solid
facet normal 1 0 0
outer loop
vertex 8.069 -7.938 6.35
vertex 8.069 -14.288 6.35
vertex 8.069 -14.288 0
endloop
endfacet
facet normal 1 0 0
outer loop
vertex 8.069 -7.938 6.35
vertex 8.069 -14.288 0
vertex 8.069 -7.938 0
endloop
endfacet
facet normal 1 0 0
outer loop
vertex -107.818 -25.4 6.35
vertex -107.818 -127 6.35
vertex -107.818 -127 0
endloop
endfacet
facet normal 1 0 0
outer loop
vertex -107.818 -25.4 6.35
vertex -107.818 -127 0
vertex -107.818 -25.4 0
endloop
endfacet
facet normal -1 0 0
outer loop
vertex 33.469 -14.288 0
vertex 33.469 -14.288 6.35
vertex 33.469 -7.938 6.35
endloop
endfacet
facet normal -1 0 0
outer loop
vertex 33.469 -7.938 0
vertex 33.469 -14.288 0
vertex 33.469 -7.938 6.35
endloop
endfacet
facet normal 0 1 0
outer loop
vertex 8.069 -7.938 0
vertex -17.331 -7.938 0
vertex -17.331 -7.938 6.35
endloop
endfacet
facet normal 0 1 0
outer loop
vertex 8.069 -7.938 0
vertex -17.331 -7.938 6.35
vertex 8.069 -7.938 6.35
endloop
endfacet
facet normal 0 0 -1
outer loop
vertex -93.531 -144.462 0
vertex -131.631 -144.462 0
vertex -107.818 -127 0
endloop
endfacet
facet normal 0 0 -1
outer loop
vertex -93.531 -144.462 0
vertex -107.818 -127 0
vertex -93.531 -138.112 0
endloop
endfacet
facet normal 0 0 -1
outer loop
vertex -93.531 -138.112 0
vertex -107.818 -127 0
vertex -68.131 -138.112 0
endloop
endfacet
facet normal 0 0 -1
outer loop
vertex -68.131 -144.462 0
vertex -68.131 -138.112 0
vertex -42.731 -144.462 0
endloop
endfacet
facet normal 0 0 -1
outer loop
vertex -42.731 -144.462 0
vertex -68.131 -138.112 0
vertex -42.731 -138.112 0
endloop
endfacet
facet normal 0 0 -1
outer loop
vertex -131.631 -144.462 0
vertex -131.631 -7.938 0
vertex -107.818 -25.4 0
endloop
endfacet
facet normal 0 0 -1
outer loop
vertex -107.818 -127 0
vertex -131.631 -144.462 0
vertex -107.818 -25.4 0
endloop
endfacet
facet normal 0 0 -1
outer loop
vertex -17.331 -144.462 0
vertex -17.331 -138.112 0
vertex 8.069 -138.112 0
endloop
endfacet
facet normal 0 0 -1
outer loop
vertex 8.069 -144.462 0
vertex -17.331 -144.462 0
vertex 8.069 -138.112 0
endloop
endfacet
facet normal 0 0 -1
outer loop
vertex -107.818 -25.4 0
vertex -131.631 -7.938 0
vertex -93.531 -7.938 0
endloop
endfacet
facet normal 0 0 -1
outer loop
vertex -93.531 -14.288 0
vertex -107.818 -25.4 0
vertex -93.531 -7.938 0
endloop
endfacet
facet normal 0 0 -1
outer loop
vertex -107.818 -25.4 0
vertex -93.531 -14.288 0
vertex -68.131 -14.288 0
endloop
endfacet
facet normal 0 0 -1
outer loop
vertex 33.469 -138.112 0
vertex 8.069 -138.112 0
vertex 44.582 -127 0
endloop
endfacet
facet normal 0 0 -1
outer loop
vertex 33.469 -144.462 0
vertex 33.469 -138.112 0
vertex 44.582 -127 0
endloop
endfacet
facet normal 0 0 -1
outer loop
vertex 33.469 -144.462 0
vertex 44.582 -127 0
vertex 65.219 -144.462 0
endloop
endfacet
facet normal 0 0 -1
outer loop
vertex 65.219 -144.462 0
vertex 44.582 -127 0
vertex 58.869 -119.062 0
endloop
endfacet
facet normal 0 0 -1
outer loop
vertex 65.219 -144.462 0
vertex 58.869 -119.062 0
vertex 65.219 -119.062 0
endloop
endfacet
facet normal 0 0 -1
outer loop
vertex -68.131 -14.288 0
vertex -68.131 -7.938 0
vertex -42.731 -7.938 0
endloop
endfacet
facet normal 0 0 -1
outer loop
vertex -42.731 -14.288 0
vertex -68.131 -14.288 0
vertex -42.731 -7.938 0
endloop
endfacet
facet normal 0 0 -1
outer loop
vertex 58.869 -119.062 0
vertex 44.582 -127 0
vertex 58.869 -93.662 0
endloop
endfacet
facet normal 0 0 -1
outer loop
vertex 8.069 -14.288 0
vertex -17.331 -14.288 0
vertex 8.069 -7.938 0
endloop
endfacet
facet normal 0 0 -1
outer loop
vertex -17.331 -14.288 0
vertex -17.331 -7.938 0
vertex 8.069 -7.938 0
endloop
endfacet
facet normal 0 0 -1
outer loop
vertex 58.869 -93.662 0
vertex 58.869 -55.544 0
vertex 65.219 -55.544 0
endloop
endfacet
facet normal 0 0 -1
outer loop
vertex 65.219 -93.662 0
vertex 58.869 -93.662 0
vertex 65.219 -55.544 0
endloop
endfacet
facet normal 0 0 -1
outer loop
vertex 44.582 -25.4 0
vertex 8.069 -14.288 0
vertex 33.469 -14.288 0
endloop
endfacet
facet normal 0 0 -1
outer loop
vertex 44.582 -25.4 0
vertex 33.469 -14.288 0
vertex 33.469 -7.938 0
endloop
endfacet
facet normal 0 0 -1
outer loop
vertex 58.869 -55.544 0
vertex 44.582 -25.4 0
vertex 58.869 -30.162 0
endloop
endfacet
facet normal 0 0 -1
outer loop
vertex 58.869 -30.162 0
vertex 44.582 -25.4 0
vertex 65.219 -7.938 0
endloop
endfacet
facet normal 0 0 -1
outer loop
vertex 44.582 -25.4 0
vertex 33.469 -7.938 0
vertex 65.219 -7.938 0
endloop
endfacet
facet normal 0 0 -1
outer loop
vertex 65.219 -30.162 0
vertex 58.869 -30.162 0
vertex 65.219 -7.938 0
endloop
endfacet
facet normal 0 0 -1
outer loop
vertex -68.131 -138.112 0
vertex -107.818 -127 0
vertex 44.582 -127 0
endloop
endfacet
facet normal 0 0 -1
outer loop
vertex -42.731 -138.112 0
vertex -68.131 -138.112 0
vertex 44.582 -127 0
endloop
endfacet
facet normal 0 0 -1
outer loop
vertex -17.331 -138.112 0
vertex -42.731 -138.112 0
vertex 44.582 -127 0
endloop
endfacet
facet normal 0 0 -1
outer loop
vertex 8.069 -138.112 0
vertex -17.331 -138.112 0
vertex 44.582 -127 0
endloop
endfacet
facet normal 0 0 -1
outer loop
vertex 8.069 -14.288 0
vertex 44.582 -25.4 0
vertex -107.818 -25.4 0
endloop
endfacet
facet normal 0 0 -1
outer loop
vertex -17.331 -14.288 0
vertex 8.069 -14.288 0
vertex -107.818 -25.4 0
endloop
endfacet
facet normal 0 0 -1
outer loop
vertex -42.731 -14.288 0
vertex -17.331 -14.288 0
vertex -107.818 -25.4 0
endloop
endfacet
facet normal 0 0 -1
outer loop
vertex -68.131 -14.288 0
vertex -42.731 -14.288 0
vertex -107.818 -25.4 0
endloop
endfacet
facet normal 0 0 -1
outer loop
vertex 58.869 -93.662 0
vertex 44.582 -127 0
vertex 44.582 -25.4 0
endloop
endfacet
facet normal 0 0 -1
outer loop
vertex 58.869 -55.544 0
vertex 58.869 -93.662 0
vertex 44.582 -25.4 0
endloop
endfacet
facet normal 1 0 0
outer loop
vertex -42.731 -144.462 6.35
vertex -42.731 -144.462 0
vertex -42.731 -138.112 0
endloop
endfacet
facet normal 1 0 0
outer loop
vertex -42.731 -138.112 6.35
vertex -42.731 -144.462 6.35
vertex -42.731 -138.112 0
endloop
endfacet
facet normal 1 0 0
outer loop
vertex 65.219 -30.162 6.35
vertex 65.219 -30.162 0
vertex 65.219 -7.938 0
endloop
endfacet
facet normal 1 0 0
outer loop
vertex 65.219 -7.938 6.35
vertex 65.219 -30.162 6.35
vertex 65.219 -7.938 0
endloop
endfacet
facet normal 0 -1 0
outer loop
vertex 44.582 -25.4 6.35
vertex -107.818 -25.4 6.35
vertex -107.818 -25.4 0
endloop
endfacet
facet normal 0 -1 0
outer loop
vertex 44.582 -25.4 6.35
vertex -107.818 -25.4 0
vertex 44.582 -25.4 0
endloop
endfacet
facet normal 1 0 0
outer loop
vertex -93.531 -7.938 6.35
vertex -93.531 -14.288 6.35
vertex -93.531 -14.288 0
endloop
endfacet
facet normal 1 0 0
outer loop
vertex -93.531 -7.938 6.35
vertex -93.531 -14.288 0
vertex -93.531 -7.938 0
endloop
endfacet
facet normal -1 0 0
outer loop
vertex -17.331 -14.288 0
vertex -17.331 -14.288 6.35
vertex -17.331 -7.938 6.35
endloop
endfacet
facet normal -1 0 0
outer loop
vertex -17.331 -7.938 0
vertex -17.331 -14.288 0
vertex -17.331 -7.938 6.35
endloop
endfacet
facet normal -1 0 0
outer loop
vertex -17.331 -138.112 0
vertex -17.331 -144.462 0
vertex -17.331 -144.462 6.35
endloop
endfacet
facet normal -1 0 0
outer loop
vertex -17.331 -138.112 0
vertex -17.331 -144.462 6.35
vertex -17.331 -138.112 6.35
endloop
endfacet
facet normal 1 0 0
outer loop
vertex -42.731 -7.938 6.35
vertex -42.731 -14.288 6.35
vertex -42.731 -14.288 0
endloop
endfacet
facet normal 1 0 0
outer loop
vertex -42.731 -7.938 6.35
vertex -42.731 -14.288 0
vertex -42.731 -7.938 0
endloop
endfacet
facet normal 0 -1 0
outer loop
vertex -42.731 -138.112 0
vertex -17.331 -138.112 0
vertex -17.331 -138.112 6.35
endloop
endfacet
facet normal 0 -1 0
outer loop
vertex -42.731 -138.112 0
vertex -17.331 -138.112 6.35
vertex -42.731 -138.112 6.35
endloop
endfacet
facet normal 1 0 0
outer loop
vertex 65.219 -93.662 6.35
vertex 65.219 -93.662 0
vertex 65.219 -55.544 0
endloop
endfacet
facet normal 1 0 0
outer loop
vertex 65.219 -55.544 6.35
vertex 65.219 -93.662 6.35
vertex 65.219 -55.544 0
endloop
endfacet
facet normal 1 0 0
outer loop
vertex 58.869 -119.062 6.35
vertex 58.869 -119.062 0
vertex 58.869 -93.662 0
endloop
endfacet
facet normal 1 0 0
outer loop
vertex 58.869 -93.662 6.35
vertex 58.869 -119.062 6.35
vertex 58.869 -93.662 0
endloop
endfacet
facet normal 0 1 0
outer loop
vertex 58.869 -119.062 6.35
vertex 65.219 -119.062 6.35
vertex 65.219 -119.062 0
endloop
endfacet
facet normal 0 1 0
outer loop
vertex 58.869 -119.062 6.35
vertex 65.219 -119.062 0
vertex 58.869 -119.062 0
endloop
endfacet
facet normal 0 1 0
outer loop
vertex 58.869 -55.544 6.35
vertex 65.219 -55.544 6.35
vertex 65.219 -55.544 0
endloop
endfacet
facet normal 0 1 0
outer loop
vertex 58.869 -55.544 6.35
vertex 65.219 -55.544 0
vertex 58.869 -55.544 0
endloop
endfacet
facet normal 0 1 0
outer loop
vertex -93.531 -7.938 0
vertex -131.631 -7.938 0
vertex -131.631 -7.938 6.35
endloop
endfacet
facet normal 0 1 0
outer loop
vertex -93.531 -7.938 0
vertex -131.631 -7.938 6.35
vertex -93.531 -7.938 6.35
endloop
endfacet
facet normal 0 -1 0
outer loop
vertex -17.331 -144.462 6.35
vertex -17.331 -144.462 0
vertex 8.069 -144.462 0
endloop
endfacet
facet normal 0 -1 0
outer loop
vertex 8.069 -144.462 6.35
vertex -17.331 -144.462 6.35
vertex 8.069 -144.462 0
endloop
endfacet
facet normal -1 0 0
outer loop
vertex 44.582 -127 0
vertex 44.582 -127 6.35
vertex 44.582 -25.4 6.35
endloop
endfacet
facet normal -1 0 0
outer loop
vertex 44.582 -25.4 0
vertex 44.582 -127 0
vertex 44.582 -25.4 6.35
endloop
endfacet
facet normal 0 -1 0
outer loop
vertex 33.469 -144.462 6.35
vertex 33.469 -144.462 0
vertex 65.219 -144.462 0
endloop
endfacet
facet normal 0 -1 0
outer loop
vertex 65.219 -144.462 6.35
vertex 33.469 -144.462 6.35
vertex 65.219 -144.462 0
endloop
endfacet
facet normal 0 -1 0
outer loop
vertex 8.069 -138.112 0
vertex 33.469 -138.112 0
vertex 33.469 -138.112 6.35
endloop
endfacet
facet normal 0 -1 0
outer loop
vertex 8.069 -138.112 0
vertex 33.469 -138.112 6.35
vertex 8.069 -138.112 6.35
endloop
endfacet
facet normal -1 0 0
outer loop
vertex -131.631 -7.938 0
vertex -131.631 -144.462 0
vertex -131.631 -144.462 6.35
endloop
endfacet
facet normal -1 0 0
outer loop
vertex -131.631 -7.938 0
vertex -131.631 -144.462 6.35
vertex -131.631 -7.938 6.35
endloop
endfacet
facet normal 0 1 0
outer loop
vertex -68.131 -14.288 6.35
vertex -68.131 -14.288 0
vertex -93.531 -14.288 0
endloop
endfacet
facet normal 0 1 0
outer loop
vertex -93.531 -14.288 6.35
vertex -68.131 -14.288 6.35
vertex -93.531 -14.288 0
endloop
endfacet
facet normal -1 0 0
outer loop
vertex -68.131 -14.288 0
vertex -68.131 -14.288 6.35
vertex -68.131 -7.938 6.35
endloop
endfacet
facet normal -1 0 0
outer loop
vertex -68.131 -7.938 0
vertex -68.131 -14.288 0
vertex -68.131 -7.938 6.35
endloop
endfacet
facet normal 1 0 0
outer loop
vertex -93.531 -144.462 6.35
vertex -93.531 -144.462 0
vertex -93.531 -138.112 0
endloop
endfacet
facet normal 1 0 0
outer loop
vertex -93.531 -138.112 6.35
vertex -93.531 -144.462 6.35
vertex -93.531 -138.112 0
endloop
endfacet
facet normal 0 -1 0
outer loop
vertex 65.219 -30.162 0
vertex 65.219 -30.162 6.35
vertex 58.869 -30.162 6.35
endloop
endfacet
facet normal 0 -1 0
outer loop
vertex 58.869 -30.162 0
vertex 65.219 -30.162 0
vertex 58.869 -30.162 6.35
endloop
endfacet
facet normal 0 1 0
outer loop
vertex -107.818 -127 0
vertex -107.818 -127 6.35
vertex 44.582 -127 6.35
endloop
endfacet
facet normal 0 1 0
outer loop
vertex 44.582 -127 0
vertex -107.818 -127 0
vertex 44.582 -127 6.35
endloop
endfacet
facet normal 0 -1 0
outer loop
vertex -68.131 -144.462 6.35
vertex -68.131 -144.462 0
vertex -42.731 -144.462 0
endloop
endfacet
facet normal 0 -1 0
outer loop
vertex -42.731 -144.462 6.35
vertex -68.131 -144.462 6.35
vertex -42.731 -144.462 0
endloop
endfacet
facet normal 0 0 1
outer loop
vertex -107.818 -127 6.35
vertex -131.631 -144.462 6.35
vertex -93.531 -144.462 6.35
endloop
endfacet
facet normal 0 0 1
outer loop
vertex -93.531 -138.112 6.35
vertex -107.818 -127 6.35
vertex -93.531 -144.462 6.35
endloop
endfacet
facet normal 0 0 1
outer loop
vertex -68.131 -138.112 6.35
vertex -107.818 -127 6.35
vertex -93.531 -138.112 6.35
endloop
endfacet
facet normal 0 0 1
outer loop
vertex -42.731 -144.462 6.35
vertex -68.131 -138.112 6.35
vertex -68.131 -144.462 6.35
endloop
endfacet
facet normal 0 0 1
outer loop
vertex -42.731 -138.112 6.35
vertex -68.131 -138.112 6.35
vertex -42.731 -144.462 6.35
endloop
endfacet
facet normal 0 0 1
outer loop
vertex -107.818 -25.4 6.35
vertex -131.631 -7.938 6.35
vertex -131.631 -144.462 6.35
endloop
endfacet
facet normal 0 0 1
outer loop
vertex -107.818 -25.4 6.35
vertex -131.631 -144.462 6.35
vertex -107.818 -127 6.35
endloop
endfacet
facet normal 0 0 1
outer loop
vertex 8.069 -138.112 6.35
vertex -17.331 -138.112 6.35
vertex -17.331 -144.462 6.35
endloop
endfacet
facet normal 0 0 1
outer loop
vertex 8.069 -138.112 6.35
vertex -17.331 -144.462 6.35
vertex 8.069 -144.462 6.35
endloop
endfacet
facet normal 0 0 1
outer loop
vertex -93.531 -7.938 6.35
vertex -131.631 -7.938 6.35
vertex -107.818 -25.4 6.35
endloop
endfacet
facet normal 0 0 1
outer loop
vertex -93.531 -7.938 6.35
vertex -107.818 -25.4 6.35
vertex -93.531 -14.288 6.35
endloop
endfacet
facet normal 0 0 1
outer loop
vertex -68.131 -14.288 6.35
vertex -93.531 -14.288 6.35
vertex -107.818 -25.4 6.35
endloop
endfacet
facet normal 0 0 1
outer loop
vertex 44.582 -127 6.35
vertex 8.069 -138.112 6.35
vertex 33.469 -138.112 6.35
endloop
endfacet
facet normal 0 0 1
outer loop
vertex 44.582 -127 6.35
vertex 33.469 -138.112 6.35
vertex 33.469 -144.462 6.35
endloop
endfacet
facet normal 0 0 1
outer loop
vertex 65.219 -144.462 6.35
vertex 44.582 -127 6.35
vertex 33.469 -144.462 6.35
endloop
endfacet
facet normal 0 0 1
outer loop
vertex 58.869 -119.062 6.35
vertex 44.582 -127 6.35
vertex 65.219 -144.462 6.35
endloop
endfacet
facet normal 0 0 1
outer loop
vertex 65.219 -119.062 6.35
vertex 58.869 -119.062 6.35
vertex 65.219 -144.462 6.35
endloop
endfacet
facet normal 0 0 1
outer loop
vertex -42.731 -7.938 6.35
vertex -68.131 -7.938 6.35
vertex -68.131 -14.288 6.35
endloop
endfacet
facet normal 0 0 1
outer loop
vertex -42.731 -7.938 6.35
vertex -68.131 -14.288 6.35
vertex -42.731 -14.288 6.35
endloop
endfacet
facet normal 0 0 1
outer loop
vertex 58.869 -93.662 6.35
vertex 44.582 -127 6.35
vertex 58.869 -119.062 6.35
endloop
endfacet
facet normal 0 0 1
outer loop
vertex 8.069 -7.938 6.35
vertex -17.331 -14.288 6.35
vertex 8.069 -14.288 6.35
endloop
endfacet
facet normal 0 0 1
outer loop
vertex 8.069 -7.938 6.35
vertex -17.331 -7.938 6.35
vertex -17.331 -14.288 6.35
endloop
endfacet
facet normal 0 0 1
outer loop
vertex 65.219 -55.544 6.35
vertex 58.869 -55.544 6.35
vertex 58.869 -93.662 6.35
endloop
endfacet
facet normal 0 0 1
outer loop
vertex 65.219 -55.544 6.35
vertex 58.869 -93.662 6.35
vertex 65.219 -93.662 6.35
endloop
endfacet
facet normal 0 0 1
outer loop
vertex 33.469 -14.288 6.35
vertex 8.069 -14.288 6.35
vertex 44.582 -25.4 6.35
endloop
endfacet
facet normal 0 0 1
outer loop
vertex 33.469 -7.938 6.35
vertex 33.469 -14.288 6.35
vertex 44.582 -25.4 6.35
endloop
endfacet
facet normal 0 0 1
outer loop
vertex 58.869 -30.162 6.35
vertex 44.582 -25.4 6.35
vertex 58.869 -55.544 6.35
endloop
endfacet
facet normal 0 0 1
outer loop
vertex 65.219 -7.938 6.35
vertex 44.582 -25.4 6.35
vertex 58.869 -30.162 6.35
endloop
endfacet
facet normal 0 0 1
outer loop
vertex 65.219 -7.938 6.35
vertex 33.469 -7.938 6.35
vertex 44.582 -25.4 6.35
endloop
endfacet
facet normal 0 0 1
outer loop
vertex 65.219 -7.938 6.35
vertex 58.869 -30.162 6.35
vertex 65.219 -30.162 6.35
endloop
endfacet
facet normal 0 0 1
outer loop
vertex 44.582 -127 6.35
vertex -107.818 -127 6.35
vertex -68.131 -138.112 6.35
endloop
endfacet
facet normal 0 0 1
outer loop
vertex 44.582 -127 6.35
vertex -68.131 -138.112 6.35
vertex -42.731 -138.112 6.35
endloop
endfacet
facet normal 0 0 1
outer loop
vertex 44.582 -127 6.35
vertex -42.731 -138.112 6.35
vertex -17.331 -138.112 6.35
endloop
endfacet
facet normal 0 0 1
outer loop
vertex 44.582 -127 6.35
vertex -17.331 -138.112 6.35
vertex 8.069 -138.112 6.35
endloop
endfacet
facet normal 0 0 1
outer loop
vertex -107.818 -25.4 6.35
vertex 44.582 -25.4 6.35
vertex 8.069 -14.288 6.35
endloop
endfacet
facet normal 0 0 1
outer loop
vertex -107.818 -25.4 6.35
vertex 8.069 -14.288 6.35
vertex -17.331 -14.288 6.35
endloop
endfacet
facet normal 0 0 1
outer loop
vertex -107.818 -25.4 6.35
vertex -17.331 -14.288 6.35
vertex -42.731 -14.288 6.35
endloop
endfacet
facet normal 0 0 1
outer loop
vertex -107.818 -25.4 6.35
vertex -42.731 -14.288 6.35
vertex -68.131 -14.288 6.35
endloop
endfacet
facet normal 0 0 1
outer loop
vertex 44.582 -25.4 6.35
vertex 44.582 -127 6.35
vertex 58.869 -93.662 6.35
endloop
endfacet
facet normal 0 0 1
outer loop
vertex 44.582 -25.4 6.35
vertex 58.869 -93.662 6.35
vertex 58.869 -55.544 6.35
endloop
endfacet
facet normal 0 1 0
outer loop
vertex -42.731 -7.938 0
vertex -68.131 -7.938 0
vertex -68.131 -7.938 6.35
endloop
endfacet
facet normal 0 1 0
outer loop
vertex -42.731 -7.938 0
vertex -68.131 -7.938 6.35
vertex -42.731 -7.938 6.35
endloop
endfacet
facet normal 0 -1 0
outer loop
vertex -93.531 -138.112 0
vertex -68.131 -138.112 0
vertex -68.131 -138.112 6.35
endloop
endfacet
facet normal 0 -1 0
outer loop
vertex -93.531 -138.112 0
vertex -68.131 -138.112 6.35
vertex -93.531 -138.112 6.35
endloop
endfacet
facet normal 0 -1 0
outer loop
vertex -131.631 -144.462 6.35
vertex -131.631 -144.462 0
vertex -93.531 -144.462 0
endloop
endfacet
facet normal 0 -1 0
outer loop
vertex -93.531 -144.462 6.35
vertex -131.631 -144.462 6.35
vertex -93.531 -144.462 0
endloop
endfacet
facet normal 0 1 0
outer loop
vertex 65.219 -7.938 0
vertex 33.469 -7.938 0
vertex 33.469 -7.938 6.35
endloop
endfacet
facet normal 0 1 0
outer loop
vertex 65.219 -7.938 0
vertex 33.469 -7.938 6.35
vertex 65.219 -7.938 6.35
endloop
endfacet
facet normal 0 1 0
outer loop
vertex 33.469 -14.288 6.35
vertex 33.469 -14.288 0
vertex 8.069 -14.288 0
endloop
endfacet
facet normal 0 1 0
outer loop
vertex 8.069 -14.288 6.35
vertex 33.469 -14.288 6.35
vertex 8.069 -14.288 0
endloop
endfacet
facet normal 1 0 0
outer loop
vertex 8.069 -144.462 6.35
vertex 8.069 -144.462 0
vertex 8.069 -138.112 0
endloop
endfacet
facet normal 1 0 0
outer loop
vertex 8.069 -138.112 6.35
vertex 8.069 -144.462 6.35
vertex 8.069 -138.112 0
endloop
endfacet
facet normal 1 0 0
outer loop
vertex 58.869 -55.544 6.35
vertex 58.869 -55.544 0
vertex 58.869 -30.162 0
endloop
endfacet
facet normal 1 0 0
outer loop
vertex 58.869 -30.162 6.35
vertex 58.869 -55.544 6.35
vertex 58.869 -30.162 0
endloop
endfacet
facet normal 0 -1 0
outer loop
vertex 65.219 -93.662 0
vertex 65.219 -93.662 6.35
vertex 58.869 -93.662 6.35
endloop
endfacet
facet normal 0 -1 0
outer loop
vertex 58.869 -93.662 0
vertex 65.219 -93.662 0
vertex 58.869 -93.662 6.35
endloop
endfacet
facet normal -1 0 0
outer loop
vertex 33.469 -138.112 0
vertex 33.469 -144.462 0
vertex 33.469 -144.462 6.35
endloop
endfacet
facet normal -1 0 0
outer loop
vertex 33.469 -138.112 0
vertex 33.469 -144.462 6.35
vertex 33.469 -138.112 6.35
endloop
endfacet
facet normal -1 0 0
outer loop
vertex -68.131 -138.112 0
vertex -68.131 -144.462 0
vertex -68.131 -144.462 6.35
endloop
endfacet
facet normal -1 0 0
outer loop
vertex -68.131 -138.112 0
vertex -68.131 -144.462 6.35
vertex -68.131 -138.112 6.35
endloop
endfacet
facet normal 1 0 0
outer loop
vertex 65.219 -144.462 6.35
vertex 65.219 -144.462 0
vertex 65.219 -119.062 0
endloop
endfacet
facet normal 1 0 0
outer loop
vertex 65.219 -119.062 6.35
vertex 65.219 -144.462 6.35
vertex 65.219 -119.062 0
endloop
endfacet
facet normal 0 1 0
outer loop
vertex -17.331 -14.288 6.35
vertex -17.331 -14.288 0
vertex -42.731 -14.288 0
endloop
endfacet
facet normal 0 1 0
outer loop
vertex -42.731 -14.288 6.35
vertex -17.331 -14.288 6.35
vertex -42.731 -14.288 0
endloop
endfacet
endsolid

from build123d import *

# Parameters (mm, degrees)
SKETCH1_W           = 196.85
SKETCH1_H           = 136.525
BOSS_EXTRUDE1_DEPTH = 6.35
SKETCH2_W           = 152.4
SKETCH2_H           = 101.6
CUT_EXTRUDE1_DEPTH  = 196.541125609
SKETCH3_W           = 6.35
SKETCH3_H           = 25.4
SKETCH3_H_2         = 25.381347512
SKETCH3_W_2         = 25.4
SKETCH3_H_3         = 6.35
CUT_EXTRUDE2_DEPTH  = 6.35


with BuildPart() as part:
    # Sketch1 → Boss-Extrude1 (new body)
    with BuildSketch(Plane.XY):
        with Locations((-33.205526088, -76.2)):
            Rectangle(SKETCH1_W, SKETCH1_H)
    extrude(amount=BOSS_EXTRUDE1_DEPTH)

    # Sketch2 → Cut-Extrude1 (cut, through all)
    with BuildSketch(Plane.XY.offset(6.35)):
        with Locations((-31.618026088, -76.2)):
            Rectangle(SKETCH2_W, SKETCH2_H)
    extrude(amount=-CUT_EXTRUDE1_DEPTH, mode=Mode.SUBTRACT)

    # Sketch3 → Cut-Extrude2 (cut)
    with BuildSketch(Plane(origin=(0, 0, 0), x_dir=(-1, 0, 0), z_dir=(0, 0, -1))):
        with Locations((-62.044473912, -106.3625)):
            Rectangle(SKETCH3_W, SKETCH3_H)
        with Locations((-62.044473912, -42.853173756)):
            Rectangle(SKETCH3_W, SKETCH3_H_2)
        with Locations((-20.769473912, -11.1125)):
            Rectangle(SKETCH3_W_2, SKETCH3_H_3)
        with Locations((30.030526088, -11.1125)):
            Rectangle(SKETCH3_W_2, SKETCH3_H_3)
        with Locations((80.830526088, -11.1125)):
            Rectangle(SKETCH3_W_2, SKETCH3_H_3)
        with Locations((-20.769473912, -141.2875)):
            Rectangle(SKETCH3_W_2, SKETCH3_H_3)
        with Locations((30.030526088, -141.2875)):
            Rectangle(SKETCH3_W_2, SKETCH3_H_3)
        with Locations((80.830526088, -141.2875)):
            Rectangle(SKETCH3_W_2, SKETCH3_H_3)
    extrude(amount=-CUT_EXTRUDE2_DEPTH, mode=Mode.SUBTRACT)


solid = part.part
